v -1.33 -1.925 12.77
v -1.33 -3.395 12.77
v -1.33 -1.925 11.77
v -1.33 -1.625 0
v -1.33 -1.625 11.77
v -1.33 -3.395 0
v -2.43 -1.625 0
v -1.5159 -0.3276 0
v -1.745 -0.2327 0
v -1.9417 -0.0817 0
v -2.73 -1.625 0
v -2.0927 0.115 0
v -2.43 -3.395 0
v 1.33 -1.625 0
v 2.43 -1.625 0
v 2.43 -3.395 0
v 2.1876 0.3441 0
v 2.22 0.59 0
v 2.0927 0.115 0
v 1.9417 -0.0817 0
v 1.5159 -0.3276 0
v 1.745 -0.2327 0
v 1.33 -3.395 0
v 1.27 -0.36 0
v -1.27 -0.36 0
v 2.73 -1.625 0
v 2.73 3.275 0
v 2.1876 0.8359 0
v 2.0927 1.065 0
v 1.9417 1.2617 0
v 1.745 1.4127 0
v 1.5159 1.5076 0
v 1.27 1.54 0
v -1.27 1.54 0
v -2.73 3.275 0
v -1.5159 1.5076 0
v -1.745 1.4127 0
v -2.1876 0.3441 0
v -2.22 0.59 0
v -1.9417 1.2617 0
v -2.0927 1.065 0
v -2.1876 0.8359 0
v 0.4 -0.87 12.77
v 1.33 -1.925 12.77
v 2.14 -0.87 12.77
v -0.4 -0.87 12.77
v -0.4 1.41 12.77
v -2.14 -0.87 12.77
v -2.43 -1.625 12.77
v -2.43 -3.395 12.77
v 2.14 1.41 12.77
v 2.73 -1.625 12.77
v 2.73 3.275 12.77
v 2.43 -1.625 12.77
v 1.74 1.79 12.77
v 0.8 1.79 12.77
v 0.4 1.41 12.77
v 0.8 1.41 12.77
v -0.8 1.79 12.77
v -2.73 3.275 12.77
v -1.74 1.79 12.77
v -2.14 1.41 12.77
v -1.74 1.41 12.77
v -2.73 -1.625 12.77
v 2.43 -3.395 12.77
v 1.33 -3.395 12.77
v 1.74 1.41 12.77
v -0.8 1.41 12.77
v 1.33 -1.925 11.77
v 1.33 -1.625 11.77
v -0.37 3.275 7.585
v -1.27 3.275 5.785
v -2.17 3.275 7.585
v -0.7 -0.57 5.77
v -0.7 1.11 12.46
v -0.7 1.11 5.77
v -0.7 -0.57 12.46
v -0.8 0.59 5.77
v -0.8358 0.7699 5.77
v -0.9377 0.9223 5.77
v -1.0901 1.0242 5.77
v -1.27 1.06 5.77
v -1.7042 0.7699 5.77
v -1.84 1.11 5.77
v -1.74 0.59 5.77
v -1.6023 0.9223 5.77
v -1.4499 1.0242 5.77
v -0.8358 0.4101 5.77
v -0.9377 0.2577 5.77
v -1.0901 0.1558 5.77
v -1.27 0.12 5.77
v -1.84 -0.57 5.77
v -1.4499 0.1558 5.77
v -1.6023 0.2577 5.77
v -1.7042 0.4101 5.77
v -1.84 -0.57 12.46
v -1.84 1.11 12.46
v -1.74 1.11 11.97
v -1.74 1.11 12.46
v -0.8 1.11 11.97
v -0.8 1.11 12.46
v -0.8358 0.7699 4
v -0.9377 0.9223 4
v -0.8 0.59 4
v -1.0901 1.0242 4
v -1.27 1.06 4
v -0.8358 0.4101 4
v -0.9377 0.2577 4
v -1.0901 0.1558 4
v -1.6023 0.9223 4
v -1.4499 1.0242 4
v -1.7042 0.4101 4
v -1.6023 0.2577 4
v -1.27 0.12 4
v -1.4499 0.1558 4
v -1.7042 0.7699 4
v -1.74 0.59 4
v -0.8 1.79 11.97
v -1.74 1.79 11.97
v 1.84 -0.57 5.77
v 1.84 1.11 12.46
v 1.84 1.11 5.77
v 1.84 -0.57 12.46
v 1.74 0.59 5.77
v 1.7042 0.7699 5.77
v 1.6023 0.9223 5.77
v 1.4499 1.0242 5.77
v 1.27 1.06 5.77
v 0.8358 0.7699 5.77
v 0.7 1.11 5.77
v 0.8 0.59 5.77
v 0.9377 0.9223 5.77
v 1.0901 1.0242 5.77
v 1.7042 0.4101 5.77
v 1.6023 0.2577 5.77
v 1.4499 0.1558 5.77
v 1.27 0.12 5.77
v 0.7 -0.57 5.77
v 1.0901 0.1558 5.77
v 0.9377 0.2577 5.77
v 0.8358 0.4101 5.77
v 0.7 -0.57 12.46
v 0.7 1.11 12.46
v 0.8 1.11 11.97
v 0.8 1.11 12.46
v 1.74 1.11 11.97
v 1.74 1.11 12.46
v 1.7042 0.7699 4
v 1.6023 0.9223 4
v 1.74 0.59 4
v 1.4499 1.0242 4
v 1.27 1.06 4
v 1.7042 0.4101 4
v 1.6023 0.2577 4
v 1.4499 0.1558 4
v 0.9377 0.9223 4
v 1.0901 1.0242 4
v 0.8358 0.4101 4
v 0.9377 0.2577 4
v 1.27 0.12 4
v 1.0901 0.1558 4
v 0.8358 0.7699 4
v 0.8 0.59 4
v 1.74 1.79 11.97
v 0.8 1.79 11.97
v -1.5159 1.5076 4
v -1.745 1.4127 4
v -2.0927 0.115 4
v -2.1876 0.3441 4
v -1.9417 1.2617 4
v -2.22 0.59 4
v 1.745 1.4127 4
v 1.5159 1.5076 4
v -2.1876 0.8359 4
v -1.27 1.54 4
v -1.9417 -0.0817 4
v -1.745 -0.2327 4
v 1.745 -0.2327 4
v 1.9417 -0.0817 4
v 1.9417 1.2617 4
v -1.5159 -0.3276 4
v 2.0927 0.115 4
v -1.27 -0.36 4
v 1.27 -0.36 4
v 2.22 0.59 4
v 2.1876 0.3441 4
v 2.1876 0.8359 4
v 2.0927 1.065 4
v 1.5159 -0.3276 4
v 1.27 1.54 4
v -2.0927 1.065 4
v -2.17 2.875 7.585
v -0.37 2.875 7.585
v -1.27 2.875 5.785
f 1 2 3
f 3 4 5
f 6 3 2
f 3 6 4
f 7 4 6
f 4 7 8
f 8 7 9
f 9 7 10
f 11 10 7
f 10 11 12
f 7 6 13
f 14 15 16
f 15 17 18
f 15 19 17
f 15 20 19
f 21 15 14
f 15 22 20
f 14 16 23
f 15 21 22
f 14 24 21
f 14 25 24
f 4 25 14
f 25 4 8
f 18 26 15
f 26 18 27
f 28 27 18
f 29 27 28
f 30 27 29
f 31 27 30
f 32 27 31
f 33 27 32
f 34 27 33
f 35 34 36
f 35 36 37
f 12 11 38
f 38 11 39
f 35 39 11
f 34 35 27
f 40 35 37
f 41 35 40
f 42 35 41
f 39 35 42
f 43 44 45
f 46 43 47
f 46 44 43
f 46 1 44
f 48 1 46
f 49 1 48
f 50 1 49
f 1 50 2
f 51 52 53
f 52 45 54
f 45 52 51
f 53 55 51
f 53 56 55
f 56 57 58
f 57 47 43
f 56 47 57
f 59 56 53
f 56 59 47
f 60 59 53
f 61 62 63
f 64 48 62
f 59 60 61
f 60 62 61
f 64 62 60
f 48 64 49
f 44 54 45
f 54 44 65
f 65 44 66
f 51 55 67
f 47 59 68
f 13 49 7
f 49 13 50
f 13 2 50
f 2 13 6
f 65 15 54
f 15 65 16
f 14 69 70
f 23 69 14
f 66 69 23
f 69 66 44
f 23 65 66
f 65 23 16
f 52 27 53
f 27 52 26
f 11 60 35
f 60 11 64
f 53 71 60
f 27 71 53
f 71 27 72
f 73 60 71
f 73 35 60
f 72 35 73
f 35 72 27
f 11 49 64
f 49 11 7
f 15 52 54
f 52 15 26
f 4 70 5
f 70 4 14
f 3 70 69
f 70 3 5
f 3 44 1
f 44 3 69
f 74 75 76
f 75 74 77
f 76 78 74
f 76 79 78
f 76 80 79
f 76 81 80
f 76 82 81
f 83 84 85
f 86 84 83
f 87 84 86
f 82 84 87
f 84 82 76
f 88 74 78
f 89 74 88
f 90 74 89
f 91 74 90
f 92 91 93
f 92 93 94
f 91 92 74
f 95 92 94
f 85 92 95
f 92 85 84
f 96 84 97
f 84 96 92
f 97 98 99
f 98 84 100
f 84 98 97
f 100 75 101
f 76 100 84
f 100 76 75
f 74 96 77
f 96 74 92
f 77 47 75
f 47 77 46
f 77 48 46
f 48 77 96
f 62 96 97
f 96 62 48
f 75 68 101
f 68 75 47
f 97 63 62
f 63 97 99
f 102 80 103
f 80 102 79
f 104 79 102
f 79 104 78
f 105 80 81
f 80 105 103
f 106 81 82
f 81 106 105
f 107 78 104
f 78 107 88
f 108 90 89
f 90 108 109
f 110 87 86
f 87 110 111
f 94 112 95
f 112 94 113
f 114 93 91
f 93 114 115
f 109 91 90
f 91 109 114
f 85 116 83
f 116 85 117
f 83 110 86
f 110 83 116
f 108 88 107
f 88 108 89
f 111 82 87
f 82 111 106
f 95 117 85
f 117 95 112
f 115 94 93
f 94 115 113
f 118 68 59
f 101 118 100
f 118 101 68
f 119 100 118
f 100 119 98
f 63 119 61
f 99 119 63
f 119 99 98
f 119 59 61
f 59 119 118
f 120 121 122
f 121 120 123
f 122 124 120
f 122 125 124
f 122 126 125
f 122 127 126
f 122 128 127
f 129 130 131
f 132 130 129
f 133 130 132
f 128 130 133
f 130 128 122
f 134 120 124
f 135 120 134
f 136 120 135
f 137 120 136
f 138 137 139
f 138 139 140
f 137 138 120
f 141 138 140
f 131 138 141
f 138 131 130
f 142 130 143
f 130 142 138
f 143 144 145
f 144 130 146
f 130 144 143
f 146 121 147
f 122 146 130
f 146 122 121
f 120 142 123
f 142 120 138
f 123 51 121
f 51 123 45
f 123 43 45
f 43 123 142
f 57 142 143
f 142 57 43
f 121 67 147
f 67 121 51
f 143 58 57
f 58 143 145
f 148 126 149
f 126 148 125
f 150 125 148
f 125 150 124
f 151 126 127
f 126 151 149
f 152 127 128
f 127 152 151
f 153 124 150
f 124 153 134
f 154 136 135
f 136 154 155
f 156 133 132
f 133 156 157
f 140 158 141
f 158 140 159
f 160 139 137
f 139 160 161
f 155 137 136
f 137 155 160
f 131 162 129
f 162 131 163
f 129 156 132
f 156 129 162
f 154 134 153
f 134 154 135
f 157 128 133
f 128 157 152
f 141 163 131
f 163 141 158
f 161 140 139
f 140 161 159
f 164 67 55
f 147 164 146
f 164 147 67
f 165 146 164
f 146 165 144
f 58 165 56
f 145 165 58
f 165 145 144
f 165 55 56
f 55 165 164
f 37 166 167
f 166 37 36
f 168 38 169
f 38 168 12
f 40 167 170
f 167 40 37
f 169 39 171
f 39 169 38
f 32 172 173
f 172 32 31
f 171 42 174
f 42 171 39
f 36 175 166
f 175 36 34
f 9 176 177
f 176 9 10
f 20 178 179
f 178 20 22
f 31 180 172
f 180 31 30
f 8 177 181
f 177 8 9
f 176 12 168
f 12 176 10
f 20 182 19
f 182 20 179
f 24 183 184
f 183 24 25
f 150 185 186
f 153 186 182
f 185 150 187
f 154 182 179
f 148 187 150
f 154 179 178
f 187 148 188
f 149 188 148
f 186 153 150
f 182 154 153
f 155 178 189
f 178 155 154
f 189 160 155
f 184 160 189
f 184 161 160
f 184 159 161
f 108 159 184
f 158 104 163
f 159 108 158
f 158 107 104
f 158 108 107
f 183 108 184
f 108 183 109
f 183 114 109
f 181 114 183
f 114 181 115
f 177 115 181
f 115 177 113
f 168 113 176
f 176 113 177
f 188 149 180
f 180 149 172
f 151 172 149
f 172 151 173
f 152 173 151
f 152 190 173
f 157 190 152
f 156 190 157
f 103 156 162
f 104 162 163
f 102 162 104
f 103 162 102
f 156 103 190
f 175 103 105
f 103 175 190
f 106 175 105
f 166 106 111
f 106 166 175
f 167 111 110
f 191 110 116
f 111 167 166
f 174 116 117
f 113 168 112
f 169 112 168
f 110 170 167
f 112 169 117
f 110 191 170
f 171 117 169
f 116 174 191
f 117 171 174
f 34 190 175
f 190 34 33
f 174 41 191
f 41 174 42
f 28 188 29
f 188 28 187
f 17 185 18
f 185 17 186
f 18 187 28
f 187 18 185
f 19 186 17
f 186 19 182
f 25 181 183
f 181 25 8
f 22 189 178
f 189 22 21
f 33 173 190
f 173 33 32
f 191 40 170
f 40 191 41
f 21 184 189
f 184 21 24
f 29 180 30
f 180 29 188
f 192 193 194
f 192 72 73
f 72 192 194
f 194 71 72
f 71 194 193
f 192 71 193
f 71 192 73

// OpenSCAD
// SPDX-FileCopyrightText: 2026 Alon A. Rabinowitz
// SPDX-License-Identifier: CC-BY-4.0

// The female, 2 pins, as it prints. Everything is in fan-connector.scad; this file only picks the part.
include <fan-connector.scad>
part = "female";
pins = 2;
